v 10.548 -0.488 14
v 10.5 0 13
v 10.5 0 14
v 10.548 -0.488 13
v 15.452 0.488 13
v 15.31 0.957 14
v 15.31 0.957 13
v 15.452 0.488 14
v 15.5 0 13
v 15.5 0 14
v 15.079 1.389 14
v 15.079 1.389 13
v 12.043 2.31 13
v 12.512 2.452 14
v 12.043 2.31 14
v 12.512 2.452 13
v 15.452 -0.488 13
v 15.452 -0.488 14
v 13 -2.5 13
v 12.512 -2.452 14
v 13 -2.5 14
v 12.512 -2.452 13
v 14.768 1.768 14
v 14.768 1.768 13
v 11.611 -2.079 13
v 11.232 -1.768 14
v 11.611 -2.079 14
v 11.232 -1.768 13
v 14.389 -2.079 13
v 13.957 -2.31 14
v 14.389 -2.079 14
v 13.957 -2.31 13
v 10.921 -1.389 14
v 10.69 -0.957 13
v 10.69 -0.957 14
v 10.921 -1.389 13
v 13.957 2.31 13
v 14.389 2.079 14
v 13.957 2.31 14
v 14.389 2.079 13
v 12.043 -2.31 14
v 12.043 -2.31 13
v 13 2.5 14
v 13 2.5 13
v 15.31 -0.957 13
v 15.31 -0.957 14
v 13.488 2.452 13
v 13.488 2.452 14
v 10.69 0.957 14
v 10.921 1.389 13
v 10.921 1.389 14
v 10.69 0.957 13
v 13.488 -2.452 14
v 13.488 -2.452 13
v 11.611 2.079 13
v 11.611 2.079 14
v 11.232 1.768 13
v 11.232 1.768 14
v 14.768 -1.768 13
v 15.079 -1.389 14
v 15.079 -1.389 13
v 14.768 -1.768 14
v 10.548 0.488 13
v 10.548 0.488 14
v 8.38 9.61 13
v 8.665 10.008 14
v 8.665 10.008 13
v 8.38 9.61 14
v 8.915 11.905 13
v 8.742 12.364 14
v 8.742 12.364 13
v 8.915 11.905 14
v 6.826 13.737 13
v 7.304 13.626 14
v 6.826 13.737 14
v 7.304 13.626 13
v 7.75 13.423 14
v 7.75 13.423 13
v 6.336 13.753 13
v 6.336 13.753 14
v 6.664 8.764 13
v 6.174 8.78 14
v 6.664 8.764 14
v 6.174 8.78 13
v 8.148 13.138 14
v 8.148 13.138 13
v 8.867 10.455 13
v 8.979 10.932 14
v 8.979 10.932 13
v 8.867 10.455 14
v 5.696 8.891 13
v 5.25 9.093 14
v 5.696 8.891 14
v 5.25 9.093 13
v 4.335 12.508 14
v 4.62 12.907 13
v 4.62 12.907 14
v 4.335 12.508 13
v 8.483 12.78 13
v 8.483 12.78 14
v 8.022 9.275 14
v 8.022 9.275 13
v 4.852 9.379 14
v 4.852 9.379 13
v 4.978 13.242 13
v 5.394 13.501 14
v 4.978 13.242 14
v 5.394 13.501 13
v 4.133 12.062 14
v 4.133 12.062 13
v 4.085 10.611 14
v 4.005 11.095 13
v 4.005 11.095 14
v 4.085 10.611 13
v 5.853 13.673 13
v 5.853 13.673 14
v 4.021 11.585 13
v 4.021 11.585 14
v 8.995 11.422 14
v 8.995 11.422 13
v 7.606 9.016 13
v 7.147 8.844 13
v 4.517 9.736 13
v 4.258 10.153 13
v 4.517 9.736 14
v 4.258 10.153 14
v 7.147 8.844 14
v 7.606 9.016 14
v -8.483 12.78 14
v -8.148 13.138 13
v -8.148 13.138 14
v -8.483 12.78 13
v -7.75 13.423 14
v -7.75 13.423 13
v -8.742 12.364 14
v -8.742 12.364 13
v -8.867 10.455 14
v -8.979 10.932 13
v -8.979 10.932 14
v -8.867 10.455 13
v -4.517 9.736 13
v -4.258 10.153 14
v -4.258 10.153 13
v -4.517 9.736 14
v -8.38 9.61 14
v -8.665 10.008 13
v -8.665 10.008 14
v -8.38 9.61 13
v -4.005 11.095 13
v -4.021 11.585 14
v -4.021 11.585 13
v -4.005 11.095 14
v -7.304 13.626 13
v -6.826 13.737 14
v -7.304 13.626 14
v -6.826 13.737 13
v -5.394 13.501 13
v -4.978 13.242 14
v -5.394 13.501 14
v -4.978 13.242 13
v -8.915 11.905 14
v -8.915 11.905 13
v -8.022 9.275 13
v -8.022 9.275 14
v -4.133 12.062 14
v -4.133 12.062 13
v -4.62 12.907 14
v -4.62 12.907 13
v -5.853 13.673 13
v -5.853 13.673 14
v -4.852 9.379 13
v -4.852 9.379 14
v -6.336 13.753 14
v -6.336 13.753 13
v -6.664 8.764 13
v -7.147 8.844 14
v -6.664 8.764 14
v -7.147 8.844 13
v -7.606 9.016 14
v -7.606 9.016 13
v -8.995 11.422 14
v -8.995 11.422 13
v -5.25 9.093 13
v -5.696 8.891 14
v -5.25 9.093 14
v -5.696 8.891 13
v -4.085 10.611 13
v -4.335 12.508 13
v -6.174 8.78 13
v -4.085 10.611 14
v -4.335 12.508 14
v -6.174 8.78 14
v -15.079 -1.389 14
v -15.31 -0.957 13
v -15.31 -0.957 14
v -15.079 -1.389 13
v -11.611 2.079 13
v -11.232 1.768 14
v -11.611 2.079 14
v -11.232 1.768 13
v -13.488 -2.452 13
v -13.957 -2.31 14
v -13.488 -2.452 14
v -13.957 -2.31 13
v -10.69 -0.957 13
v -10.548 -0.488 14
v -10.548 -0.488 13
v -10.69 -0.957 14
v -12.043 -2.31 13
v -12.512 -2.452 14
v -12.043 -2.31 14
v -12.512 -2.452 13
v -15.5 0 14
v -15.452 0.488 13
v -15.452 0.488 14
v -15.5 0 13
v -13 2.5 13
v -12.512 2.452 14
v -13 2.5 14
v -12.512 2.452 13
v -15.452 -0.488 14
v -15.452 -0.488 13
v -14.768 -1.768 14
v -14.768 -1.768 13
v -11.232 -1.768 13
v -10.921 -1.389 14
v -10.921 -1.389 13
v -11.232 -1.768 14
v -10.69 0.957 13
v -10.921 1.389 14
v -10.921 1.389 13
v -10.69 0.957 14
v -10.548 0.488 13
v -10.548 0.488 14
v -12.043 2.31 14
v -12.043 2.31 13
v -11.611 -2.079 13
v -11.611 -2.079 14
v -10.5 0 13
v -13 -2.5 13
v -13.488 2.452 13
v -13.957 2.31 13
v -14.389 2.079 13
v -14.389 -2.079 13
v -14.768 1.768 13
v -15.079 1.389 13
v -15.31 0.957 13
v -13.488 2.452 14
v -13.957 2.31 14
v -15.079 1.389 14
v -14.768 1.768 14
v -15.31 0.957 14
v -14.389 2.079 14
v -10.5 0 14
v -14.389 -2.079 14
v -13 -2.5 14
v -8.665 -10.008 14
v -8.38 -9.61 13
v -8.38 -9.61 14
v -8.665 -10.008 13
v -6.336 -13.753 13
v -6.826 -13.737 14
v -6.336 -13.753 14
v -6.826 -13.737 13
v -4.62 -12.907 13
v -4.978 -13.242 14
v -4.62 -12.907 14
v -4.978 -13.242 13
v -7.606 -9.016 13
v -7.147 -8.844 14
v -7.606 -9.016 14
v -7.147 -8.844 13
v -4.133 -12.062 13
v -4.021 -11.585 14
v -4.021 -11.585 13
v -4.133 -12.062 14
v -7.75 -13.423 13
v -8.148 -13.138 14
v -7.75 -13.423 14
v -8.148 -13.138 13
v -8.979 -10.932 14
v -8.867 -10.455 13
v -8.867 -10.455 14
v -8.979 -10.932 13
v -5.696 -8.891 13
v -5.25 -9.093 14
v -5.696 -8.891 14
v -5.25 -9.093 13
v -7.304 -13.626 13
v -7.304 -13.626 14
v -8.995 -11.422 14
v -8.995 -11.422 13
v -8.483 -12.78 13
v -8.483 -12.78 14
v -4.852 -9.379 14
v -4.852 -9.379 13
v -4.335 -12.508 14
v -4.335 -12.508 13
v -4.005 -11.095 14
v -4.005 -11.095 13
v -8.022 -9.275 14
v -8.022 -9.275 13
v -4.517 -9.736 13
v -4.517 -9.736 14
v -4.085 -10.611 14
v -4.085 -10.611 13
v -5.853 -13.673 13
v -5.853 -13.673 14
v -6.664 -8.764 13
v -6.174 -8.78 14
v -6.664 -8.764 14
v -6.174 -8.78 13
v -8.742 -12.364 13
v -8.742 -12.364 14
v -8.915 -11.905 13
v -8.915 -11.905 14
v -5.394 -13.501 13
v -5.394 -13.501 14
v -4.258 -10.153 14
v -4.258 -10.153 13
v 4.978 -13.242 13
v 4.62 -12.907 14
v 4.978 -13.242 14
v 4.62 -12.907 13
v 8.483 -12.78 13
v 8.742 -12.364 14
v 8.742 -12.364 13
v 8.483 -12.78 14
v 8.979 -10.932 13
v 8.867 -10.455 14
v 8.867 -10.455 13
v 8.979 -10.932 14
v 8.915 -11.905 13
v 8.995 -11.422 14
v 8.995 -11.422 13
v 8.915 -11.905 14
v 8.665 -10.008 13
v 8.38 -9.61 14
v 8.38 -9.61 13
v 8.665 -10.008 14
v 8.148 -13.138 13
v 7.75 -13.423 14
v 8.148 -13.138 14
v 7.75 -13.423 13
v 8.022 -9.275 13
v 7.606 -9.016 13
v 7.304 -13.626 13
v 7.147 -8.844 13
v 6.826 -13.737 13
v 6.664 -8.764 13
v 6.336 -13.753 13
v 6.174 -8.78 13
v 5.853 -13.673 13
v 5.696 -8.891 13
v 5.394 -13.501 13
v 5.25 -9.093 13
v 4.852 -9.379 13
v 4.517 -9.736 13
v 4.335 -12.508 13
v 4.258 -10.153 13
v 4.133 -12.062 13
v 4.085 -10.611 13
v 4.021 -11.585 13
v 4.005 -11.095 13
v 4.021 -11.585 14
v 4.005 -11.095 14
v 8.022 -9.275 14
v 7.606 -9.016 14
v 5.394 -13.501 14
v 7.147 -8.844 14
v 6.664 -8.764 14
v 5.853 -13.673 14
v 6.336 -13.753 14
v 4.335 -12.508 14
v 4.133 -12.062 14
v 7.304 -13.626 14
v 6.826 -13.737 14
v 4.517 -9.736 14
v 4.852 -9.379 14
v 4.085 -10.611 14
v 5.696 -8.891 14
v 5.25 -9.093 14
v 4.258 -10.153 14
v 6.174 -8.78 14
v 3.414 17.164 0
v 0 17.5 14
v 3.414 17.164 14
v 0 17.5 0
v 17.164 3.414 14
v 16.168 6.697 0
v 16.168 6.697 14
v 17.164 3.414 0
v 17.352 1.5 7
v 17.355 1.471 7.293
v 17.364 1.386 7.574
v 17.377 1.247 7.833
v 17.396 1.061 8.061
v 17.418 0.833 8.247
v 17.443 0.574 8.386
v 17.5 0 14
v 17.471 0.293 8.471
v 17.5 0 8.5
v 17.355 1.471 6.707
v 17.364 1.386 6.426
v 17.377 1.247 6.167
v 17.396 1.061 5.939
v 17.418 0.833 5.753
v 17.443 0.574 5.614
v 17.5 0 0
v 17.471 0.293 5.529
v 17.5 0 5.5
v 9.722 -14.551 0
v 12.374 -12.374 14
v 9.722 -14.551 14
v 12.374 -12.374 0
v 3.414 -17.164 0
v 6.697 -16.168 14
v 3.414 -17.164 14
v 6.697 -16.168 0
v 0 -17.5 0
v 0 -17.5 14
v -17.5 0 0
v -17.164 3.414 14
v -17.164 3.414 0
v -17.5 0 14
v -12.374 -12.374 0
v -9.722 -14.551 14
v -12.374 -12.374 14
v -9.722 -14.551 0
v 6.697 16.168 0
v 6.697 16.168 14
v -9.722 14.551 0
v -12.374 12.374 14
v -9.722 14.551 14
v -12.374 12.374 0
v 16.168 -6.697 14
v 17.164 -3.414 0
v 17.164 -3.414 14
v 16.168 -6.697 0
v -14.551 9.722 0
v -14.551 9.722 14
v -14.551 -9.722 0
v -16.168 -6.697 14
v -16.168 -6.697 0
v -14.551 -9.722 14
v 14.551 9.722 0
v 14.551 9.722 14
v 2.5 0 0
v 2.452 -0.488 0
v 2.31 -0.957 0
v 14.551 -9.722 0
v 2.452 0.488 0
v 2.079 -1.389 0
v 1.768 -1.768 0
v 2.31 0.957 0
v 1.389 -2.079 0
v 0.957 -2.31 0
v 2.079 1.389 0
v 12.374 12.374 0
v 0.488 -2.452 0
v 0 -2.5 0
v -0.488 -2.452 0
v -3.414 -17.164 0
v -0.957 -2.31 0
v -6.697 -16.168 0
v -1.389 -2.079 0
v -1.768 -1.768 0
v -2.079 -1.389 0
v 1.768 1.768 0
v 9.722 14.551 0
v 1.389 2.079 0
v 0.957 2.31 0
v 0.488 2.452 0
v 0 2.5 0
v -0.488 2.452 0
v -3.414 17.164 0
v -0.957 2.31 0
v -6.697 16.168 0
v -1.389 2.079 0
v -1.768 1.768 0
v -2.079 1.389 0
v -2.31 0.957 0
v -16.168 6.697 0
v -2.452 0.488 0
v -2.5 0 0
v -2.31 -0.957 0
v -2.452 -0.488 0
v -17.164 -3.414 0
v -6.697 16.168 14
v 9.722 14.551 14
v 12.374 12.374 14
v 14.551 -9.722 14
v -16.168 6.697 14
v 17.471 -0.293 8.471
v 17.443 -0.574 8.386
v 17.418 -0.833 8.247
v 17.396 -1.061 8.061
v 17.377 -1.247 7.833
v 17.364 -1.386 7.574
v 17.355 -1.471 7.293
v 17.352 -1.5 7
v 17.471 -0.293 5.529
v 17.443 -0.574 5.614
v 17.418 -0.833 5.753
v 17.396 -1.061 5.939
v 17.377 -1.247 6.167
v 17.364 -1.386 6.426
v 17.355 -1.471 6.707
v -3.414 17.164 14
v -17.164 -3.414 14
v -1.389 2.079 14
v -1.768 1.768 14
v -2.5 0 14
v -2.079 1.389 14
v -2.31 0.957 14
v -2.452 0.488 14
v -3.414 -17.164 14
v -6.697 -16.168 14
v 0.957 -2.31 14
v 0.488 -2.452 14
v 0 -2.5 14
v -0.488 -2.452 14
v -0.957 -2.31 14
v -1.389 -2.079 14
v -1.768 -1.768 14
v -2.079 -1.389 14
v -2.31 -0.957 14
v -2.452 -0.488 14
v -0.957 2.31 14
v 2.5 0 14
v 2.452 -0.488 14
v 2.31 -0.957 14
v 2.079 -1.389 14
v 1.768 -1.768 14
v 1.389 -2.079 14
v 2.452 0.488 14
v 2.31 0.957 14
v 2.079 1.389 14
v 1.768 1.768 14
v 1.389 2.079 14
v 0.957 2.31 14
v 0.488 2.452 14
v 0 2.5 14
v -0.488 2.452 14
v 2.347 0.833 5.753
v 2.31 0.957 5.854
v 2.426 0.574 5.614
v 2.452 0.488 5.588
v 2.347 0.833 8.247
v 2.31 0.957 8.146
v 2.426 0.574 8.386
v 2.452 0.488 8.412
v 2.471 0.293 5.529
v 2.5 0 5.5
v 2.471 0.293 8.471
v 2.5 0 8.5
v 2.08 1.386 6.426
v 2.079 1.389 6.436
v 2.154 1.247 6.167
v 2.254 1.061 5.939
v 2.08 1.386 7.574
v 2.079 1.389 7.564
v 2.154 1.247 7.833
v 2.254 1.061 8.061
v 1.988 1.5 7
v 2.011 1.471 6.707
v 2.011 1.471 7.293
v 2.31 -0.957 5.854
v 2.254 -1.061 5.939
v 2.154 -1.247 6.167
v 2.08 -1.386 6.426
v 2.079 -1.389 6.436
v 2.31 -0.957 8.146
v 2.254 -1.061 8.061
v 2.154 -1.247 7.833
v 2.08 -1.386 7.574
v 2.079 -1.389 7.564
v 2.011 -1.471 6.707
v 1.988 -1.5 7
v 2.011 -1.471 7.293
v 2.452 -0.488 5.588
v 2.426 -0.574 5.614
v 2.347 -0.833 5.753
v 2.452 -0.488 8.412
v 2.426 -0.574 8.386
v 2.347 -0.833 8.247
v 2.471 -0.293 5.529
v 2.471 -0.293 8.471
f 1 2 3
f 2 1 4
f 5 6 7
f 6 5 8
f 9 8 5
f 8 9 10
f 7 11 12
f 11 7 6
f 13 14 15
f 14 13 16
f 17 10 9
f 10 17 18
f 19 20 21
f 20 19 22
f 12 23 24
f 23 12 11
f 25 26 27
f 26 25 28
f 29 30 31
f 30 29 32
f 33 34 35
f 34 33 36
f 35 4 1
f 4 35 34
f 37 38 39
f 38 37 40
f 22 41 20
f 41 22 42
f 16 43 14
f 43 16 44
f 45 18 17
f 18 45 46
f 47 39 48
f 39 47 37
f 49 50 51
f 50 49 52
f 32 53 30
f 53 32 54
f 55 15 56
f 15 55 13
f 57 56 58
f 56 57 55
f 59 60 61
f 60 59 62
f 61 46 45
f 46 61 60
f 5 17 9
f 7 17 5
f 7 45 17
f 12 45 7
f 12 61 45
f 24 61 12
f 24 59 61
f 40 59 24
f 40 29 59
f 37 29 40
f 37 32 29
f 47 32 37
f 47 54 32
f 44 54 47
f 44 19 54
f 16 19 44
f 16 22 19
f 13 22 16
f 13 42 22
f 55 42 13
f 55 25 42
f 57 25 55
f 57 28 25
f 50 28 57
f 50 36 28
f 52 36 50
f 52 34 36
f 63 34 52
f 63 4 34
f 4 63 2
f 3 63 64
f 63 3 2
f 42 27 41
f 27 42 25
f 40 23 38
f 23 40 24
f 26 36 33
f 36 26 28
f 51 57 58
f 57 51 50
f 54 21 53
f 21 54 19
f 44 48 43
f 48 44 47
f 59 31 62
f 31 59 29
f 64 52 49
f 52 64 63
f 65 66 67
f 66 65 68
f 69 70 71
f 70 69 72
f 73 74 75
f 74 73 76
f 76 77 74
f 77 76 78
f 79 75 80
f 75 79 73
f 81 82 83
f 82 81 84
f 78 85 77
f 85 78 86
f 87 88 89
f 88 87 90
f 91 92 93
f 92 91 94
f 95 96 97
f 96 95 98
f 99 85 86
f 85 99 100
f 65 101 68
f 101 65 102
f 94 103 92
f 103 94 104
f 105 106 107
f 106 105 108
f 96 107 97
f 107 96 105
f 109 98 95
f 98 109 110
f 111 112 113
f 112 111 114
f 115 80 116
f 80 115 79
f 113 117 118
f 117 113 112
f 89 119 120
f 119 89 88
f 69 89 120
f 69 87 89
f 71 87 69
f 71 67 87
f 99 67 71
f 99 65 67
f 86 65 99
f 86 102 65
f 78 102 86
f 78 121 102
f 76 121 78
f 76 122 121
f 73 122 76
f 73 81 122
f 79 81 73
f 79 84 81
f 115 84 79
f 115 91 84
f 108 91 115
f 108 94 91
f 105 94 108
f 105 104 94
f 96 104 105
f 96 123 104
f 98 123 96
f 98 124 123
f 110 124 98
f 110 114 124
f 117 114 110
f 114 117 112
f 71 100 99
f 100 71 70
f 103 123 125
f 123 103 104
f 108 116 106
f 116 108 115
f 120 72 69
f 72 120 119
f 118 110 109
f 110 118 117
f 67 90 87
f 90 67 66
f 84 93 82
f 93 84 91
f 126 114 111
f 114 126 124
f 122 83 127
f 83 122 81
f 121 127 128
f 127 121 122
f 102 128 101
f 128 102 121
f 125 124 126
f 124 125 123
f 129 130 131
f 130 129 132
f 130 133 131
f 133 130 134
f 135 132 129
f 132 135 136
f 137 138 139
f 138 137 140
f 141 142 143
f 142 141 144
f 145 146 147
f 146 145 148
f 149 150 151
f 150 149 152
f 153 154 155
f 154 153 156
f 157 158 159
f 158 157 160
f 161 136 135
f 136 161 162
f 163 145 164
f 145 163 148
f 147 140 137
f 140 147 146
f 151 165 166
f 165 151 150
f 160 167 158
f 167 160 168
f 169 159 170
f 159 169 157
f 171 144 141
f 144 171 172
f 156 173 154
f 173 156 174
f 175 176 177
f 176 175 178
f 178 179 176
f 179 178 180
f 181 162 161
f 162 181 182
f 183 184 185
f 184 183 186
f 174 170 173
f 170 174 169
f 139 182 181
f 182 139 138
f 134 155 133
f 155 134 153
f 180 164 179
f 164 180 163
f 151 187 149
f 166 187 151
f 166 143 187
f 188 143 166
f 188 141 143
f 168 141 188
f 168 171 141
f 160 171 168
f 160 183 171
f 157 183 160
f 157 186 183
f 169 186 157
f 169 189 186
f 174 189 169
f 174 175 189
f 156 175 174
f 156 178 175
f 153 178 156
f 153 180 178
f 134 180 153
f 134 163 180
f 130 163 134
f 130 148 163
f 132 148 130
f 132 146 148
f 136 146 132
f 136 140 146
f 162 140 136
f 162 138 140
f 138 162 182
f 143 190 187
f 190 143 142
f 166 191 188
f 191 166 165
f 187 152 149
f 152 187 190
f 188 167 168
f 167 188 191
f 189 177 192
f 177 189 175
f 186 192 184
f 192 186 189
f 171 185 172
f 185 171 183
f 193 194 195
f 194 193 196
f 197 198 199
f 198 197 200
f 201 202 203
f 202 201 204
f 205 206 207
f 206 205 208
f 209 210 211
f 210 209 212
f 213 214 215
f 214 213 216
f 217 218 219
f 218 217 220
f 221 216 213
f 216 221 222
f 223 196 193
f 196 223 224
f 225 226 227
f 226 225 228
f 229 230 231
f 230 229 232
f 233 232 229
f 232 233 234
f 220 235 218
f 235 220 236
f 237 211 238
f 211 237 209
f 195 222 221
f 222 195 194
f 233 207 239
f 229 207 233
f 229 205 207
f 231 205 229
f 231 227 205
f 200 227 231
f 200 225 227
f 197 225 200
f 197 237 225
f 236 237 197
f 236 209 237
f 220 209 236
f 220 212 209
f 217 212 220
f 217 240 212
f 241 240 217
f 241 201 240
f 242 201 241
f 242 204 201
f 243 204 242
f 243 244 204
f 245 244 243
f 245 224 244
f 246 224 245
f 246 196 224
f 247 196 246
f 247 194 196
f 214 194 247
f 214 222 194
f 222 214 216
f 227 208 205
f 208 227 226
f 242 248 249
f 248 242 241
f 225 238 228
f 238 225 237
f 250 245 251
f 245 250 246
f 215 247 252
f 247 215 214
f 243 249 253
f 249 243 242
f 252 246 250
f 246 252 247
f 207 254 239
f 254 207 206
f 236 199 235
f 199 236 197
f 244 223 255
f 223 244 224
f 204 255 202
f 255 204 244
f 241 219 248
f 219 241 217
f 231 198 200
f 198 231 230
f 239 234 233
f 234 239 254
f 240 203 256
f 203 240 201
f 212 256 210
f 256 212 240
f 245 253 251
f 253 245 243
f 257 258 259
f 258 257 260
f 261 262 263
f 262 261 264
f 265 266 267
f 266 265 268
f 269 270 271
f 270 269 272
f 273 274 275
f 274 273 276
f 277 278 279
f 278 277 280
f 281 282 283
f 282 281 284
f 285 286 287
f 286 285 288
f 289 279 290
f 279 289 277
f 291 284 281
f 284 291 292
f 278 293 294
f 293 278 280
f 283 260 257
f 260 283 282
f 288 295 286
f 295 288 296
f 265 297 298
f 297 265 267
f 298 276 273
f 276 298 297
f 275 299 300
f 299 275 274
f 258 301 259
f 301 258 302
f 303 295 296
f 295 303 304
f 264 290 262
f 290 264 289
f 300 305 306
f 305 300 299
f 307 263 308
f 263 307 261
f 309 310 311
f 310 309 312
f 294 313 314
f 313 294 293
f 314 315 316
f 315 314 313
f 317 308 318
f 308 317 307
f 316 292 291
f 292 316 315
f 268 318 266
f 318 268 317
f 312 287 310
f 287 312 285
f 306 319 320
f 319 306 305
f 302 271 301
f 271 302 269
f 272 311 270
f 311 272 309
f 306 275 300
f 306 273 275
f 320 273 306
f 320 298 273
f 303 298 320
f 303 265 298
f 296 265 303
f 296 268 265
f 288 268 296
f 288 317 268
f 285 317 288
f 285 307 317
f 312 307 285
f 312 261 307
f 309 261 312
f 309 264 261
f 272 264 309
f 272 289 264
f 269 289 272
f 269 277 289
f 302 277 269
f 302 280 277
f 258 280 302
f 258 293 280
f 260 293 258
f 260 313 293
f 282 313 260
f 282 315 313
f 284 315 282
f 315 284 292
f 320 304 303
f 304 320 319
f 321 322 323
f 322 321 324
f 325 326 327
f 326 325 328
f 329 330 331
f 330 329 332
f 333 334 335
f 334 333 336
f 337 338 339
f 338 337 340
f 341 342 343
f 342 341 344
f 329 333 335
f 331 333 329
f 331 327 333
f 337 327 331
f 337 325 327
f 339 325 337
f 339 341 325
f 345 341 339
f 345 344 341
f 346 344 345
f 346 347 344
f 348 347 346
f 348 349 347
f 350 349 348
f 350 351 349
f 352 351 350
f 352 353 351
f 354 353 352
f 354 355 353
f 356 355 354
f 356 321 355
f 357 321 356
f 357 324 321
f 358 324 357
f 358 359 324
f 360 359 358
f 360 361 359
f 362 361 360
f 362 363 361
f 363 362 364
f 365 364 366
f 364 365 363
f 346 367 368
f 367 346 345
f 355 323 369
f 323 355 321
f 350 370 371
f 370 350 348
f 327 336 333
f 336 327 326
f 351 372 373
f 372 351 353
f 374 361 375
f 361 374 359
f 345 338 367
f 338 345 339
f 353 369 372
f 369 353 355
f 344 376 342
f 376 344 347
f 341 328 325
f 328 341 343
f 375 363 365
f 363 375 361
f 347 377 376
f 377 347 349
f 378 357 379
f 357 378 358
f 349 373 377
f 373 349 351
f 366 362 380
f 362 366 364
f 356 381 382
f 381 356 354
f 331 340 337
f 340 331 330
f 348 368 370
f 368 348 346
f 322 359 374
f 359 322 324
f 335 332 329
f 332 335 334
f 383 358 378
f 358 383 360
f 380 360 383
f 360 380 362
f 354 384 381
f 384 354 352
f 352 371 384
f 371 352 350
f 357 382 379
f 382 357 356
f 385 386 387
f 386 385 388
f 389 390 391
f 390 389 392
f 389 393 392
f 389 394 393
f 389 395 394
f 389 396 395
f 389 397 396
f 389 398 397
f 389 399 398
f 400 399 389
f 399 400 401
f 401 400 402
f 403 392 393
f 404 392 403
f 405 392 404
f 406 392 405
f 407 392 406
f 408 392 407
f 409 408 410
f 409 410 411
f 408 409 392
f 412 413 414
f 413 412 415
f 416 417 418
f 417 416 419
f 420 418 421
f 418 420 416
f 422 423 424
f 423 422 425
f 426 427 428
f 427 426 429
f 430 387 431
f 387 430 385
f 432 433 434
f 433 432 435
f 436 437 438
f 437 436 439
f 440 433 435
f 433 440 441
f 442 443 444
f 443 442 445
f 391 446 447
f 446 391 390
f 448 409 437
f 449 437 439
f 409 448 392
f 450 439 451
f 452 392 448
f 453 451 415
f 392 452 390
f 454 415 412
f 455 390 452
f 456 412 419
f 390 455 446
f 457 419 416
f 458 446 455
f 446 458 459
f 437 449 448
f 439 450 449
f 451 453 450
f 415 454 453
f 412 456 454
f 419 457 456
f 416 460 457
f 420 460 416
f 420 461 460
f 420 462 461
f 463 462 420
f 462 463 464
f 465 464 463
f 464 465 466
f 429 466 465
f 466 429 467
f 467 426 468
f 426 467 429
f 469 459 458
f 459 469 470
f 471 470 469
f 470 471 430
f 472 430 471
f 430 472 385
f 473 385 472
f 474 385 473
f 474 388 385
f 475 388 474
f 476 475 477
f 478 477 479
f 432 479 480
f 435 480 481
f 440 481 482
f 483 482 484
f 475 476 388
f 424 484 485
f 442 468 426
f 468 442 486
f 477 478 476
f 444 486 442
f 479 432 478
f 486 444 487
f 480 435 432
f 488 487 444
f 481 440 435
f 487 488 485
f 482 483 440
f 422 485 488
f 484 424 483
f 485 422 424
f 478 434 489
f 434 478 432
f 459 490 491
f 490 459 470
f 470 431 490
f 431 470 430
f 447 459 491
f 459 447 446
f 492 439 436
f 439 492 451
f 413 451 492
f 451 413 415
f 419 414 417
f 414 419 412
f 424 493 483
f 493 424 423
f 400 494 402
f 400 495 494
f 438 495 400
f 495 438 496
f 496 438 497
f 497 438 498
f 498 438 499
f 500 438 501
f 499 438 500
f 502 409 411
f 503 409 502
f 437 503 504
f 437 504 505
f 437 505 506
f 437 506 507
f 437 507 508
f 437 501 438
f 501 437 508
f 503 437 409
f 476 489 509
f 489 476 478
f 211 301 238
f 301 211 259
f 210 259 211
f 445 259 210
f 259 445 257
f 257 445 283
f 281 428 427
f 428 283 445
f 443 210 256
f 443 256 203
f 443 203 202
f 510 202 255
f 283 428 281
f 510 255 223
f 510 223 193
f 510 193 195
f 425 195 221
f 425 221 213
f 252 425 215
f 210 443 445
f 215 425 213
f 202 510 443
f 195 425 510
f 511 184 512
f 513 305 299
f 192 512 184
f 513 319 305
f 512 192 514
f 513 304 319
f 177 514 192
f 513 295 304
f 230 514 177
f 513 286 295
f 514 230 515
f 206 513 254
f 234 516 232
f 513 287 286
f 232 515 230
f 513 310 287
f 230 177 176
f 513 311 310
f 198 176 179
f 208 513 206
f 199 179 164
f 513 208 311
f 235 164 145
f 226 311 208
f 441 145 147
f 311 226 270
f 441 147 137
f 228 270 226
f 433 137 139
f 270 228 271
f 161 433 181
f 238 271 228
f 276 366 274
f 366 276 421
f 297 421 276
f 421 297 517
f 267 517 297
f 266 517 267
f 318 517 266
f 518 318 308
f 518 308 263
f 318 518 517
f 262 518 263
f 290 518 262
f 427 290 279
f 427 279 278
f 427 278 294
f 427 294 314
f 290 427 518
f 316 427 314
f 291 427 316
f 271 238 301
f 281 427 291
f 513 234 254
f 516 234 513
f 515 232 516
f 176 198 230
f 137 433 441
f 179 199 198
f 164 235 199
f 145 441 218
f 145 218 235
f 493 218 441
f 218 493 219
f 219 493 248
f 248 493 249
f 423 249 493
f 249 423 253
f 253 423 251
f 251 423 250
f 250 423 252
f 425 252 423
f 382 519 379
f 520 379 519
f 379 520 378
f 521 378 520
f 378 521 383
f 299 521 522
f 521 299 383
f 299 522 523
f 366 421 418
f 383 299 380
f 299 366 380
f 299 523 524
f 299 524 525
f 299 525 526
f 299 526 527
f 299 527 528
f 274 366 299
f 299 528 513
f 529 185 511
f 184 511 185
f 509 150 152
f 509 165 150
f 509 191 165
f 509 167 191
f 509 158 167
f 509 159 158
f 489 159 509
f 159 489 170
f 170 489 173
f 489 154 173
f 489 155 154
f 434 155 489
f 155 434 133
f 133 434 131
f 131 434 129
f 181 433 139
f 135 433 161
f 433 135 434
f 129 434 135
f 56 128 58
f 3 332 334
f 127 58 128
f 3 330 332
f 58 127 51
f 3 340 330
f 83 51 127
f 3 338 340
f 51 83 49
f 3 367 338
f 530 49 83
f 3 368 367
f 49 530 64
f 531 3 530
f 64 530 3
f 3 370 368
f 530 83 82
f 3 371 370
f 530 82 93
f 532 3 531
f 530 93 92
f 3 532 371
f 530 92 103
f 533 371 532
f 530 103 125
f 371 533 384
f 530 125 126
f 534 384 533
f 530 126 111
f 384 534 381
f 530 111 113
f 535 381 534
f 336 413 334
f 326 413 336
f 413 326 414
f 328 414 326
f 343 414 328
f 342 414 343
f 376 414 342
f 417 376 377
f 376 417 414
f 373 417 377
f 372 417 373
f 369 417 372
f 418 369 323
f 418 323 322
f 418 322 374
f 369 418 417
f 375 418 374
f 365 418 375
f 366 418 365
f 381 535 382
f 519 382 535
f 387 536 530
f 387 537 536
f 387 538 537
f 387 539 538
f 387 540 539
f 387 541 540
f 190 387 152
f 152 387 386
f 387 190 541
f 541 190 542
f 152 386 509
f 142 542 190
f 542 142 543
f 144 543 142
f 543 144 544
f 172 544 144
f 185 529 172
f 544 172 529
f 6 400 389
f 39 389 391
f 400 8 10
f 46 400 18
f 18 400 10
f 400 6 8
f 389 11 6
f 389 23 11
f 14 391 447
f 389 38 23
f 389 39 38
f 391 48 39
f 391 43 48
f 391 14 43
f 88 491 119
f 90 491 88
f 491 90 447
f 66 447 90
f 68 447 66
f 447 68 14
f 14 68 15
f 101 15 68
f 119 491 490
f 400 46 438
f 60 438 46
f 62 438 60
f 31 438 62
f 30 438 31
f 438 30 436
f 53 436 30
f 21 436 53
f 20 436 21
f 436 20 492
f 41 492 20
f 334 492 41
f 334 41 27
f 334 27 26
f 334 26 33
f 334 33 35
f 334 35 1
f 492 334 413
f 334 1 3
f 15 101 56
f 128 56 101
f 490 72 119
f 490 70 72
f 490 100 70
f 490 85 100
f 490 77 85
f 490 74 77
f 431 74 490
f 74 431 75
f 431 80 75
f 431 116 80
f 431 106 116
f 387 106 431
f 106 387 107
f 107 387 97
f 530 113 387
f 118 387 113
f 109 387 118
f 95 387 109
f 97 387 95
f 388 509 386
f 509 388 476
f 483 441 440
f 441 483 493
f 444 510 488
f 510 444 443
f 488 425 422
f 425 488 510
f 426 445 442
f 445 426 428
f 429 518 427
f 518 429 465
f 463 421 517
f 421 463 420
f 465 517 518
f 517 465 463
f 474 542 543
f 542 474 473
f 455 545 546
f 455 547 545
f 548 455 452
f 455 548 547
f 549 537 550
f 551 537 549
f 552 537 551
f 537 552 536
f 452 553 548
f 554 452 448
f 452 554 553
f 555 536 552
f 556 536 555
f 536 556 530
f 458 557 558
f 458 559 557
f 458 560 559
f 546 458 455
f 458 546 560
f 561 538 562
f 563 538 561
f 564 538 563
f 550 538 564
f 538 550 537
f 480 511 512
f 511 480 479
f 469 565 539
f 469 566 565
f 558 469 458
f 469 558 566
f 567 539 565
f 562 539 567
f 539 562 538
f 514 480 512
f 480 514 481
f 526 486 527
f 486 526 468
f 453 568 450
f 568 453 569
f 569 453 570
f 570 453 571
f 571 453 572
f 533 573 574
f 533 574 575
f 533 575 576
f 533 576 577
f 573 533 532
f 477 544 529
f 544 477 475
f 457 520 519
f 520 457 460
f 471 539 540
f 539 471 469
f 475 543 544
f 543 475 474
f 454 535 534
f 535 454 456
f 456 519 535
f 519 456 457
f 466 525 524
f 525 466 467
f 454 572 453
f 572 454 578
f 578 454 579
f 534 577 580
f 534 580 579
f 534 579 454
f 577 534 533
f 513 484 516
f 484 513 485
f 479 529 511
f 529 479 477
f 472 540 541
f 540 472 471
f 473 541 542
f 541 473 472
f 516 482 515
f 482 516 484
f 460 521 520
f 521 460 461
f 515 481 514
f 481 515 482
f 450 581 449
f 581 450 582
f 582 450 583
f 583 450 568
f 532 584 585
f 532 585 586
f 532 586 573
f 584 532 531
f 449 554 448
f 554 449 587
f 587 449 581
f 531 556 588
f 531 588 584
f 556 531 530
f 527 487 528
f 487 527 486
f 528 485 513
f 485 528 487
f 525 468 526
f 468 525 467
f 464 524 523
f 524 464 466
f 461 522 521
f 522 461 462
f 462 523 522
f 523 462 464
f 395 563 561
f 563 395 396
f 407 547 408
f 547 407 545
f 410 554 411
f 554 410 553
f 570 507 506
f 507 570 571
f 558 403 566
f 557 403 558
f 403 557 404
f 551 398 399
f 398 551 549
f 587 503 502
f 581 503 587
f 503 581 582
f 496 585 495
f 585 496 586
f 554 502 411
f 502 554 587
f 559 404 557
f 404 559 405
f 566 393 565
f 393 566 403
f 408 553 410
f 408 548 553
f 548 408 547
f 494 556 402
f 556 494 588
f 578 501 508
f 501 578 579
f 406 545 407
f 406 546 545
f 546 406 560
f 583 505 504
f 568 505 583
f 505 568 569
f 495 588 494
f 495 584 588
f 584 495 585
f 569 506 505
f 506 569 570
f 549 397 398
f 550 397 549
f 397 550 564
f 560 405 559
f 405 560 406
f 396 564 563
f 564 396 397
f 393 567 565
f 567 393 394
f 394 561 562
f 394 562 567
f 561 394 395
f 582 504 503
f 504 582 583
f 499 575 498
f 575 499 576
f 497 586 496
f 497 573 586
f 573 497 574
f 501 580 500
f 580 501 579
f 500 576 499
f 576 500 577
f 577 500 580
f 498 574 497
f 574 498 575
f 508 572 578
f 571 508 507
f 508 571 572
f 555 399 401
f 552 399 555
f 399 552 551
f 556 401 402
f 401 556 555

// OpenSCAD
$fn = 32;

// ----------------------------------------------------------------------
// Control knob: dimpled knob
// ----------------------------------------------------------------------

// --- parameters (mm) ---
dimp_d = 5;               // finger dimple diameter
n_dimp = 6;               // number of dimples
dimp_r = 13;              // dimple ring radius
knob_d = 35;              // knob body diameter
knob_h = 14;              // knob body height
bore_d = 5;               // shaft bore diameter
set_d = 3;                // set screw bore diameter
fit_tol = 0.02;           // tolerance for press fits, mm
free_tol = 0.2;           // tolerance for clearance fits, mm

dimp_step = 360 / n_dimp;  // dimple angular step

difference() {
  cylinder(h = knob_h, d = knob_d);
  translate([0, 0, -1]) cylinder(h = knob_h + 2, d = bore_d);
  translate([-1, 0, knob_h / 2]) rotate([0, 90, 0])
    cylinder(h = knob_d / 2 + bore_d / 2 + 2, d = set_d);  for (i = [0 : n_dimp - 1])
    rotate([0, 0, i * dimp_step])
      translate([dimp_r, 0, knob_h - 1])
        cylinder(h = 2, d = dimp_d);
}
